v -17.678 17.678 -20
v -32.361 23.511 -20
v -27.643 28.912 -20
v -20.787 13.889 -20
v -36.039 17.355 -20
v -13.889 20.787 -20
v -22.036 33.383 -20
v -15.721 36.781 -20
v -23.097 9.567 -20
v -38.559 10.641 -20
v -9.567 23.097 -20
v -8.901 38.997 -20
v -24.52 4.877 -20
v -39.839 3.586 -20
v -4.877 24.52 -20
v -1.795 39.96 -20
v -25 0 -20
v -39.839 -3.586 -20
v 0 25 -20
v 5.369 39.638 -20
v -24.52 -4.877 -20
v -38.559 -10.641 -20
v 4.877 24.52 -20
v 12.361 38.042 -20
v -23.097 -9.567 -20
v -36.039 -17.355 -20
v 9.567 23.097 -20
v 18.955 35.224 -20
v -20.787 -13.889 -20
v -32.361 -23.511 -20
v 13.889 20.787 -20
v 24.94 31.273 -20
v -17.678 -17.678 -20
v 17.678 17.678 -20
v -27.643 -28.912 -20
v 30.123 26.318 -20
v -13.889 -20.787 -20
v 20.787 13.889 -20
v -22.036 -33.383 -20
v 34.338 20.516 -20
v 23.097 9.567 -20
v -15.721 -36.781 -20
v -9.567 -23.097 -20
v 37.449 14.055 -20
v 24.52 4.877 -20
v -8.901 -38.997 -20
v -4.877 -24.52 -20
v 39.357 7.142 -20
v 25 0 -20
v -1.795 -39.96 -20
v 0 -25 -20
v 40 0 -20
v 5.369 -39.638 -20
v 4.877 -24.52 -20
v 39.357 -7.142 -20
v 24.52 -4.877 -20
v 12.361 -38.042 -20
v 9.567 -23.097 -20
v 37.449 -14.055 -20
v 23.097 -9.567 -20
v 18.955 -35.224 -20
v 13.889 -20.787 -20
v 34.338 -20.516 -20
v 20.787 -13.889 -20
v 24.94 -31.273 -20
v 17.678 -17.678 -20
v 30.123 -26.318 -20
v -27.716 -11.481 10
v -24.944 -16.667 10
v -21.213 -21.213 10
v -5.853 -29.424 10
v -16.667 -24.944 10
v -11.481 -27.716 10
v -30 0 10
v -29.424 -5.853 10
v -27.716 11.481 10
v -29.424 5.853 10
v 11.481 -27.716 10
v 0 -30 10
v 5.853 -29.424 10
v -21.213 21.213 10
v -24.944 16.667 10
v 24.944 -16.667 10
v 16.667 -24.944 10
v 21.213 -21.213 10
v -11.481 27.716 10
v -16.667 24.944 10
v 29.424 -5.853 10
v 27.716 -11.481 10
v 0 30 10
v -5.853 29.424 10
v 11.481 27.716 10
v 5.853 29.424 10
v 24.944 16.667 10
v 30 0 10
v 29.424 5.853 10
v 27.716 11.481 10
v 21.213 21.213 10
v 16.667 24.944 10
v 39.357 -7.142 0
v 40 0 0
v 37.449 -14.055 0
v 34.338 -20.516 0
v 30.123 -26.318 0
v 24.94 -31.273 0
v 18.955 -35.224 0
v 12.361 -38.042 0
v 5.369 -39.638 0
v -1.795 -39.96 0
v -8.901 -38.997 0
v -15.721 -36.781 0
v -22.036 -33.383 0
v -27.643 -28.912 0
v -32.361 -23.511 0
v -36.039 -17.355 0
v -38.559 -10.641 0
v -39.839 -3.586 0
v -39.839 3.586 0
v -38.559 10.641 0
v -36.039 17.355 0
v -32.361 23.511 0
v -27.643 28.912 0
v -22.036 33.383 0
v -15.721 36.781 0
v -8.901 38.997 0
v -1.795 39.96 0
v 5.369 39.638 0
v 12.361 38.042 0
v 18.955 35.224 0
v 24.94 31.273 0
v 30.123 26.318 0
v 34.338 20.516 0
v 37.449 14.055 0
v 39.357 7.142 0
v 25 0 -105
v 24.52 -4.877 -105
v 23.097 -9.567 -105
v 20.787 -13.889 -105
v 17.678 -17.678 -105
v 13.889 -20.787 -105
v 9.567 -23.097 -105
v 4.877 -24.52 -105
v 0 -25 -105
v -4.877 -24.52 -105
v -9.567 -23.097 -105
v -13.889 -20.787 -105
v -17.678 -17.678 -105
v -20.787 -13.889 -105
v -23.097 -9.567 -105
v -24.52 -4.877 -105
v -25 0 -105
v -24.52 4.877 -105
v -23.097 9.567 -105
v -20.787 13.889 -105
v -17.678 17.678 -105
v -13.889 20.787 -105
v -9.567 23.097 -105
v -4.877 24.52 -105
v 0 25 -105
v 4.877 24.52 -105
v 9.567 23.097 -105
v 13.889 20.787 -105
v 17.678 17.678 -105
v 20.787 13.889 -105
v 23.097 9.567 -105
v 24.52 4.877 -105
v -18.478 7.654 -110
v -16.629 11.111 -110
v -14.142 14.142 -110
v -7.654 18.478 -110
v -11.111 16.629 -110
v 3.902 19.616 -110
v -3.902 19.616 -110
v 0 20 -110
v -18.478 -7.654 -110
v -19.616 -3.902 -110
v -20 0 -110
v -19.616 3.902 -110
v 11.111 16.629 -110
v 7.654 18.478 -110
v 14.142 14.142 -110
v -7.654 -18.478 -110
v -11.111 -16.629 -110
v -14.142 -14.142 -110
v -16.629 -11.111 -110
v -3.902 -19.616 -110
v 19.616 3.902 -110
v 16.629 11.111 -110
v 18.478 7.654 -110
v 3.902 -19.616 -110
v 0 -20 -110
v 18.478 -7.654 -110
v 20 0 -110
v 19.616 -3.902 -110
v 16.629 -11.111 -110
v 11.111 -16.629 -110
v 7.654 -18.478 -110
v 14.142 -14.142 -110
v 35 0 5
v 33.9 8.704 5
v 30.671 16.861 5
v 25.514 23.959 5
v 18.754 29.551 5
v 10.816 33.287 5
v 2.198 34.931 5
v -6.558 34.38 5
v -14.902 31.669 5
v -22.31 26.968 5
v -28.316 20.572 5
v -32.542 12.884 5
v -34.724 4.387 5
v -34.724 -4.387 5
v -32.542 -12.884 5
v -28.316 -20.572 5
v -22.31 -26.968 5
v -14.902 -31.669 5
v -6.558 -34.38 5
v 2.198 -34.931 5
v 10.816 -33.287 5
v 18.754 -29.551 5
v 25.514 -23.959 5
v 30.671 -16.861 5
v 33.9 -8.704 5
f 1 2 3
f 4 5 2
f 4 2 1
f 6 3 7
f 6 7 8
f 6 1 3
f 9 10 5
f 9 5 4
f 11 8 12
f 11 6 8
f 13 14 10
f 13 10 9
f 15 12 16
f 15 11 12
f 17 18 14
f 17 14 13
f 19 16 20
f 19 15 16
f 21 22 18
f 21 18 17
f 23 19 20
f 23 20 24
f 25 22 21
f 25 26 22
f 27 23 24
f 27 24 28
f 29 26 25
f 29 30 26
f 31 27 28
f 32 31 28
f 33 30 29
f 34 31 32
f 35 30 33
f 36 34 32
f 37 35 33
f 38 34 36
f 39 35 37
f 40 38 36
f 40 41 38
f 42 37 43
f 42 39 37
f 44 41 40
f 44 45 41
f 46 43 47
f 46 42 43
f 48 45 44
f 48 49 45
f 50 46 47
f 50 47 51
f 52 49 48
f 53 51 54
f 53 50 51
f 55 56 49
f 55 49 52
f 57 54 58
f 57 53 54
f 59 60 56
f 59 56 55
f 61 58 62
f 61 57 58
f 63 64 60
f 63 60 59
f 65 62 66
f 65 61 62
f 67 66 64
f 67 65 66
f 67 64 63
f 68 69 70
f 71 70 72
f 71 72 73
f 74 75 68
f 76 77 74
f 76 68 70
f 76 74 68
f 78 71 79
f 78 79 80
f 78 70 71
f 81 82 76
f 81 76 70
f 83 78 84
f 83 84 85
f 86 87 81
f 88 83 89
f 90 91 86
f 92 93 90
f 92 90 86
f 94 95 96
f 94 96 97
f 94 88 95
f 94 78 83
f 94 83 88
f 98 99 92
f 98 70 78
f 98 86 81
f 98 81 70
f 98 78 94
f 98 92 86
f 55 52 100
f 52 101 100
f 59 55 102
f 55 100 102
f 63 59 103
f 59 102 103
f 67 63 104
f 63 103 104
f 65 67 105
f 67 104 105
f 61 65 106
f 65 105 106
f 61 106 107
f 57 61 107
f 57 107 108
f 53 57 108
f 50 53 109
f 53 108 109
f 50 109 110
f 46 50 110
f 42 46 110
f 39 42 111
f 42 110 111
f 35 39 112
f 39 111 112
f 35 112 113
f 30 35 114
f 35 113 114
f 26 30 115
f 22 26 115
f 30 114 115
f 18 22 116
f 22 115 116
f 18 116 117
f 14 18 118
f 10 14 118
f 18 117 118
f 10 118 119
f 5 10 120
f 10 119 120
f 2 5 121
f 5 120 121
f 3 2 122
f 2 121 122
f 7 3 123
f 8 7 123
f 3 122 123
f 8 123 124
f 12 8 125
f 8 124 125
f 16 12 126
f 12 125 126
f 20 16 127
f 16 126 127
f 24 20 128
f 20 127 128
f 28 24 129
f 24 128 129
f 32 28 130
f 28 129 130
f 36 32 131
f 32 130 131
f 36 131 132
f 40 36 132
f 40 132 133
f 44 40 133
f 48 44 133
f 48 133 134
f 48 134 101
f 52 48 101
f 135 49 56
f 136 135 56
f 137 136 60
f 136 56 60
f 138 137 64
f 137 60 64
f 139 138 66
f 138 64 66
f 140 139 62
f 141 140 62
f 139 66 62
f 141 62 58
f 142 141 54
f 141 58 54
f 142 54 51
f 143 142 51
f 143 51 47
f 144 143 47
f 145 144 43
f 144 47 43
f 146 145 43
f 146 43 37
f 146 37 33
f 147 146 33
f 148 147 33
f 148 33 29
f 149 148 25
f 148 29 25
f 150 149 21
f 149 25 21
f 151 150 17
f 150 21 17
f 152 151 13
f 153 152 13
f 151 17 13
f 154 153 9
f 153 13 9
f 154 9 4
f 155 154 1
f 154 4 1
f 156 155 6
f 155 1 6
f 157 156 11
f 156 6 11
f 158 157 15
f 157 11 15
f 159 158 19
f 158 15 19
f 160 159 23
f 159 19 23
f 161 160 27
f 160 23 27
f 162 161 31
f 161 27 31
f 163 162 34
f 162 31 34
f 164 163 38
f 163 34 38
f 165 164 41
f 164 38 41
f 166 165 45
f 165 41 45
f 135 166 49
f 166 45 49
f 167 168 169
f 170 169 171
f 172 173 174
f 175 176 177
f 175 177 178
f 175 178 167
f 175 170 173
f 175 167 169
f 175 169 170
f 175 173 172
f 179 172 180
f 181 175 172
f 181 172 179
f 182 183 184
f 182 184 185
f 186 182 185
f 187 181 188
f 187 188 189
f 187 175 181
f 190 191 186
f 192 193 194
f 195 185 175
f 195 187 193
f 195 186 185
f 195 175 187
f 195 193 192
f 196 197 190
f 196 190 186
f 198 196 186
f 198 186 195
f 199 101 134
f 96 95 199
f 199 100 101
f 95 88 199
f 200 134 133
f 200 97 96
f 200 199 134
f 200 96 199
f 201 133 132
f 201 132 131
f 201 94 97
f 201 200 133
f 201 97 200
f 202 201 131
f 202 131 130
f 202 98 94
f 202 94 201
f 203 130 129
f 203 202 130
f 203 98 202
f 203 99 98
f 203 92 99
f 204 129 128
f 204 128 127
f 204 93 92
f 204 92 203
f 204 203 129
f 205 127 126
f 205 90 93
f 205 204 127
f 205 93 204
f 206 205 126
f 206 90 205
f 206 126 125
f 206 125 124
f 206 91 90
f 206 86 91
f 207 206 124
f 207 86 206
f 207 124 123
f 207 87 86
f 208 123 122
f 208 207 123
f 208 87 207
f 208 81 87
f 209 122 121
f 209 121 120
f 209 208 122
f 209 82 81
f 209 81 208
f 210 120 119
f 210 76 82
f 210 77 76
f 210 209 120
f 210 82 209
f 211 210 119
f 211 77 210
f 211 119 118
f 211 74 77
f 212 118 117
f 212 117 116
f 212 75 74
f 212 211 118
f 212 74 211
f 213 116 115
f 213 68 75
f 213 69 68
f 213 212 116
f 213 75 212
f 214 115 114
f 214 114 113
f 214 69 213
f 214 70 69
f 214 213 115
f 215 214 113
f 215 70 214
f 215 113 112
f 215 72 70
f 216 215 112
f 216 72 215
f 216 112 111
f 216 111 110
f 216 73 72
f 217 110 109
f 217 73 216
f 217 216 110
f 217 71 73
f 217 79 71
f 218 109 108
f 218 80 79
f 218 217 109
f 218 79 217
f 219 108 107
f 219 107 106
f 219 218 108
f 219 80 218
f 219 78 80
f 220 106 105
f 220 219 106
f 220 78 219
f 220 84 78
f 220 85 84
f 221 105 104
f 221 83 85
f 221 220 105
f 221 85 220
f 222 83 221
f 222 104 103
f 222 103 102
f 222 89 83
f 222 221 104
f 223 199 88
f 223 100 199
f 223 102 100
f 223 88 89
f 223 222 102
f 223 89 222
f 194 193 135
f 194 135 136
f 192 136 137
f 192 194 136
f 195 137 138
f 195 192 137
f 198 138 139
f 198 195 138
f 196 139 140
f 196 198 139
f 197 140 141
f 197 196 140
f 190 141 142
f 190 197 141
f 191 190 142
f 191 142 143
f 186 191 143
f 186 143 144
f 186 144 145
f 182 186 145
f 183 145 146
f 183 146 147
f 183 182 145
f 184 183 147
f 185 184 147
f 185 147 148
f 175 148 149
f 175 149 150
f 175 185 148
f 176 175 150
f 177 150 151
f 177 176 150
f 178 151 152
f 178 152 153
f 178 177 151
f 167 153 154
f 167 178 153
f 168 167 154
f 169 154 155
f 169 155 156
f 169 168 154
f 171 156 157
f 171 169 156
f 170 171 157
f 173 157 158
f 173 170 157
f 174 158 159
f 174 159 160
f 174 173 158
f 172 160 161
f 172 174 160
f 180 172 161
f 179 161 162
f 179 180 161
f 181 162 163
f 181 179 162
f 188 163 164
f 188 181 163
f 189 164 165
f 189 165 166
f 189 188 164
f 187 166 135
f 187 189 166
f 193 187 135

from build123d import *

# Parameters (mm, degrees)
F0_R     = 40
F1_DEPTH = 10
F3_SIZE  = 9.99999
F2_R     = 40
F4_DEPTH = 20
F5_R     = 25
F6_DEPTH = 90
F7_SIZE  = 5


# Not quite as in the source:
# - a fillet or chamfer is up to 0.001 mm smaller than in the source, because OpenCascade refuses the exact size


with BuildPart() as f1:
    # F0 (on Top) → F1 (new body)
    with BuildSketch(Plane.XY):
        Circle(F0_R)
    extrude(amount=F1_DEPTH)

    # F3 (size 10 in the source; OpenCascade refuses exactly that, so slightly less here)
    f3_edges = [f1.edges().sort_by_distance(p)[0] for p in [
        (-40, 0, 10),
    ]]
    chamfer(f3_edges, length=F3_SIZE)

    # F2 (on face) → F4 (join)
    with BuildSketch(Plane(origin=(0, 0, 0), x_dir=(1, 0, 0), z_dir=(0, 0, -1))):
        Circle(F2_R)
    extrude(amount=F4_DEPTH)

    # F5 (on face) → F6 (join)
    with BuildSketch(Plane(origin=(0, 0, -20), x_dir=(1, 0, 0), z_dir=(0, 0, -1))):
        Circle(F5_R)
    extrude(amount=F6_DEPTH)

    # F7
    f7_edges = [f1.edges().sort_by_distance(p)[0] for p in [
        (-25, 0, -110),
    ]]
    chamfer(f7_edges, length=F7_SIZE)


solid = f1.part
